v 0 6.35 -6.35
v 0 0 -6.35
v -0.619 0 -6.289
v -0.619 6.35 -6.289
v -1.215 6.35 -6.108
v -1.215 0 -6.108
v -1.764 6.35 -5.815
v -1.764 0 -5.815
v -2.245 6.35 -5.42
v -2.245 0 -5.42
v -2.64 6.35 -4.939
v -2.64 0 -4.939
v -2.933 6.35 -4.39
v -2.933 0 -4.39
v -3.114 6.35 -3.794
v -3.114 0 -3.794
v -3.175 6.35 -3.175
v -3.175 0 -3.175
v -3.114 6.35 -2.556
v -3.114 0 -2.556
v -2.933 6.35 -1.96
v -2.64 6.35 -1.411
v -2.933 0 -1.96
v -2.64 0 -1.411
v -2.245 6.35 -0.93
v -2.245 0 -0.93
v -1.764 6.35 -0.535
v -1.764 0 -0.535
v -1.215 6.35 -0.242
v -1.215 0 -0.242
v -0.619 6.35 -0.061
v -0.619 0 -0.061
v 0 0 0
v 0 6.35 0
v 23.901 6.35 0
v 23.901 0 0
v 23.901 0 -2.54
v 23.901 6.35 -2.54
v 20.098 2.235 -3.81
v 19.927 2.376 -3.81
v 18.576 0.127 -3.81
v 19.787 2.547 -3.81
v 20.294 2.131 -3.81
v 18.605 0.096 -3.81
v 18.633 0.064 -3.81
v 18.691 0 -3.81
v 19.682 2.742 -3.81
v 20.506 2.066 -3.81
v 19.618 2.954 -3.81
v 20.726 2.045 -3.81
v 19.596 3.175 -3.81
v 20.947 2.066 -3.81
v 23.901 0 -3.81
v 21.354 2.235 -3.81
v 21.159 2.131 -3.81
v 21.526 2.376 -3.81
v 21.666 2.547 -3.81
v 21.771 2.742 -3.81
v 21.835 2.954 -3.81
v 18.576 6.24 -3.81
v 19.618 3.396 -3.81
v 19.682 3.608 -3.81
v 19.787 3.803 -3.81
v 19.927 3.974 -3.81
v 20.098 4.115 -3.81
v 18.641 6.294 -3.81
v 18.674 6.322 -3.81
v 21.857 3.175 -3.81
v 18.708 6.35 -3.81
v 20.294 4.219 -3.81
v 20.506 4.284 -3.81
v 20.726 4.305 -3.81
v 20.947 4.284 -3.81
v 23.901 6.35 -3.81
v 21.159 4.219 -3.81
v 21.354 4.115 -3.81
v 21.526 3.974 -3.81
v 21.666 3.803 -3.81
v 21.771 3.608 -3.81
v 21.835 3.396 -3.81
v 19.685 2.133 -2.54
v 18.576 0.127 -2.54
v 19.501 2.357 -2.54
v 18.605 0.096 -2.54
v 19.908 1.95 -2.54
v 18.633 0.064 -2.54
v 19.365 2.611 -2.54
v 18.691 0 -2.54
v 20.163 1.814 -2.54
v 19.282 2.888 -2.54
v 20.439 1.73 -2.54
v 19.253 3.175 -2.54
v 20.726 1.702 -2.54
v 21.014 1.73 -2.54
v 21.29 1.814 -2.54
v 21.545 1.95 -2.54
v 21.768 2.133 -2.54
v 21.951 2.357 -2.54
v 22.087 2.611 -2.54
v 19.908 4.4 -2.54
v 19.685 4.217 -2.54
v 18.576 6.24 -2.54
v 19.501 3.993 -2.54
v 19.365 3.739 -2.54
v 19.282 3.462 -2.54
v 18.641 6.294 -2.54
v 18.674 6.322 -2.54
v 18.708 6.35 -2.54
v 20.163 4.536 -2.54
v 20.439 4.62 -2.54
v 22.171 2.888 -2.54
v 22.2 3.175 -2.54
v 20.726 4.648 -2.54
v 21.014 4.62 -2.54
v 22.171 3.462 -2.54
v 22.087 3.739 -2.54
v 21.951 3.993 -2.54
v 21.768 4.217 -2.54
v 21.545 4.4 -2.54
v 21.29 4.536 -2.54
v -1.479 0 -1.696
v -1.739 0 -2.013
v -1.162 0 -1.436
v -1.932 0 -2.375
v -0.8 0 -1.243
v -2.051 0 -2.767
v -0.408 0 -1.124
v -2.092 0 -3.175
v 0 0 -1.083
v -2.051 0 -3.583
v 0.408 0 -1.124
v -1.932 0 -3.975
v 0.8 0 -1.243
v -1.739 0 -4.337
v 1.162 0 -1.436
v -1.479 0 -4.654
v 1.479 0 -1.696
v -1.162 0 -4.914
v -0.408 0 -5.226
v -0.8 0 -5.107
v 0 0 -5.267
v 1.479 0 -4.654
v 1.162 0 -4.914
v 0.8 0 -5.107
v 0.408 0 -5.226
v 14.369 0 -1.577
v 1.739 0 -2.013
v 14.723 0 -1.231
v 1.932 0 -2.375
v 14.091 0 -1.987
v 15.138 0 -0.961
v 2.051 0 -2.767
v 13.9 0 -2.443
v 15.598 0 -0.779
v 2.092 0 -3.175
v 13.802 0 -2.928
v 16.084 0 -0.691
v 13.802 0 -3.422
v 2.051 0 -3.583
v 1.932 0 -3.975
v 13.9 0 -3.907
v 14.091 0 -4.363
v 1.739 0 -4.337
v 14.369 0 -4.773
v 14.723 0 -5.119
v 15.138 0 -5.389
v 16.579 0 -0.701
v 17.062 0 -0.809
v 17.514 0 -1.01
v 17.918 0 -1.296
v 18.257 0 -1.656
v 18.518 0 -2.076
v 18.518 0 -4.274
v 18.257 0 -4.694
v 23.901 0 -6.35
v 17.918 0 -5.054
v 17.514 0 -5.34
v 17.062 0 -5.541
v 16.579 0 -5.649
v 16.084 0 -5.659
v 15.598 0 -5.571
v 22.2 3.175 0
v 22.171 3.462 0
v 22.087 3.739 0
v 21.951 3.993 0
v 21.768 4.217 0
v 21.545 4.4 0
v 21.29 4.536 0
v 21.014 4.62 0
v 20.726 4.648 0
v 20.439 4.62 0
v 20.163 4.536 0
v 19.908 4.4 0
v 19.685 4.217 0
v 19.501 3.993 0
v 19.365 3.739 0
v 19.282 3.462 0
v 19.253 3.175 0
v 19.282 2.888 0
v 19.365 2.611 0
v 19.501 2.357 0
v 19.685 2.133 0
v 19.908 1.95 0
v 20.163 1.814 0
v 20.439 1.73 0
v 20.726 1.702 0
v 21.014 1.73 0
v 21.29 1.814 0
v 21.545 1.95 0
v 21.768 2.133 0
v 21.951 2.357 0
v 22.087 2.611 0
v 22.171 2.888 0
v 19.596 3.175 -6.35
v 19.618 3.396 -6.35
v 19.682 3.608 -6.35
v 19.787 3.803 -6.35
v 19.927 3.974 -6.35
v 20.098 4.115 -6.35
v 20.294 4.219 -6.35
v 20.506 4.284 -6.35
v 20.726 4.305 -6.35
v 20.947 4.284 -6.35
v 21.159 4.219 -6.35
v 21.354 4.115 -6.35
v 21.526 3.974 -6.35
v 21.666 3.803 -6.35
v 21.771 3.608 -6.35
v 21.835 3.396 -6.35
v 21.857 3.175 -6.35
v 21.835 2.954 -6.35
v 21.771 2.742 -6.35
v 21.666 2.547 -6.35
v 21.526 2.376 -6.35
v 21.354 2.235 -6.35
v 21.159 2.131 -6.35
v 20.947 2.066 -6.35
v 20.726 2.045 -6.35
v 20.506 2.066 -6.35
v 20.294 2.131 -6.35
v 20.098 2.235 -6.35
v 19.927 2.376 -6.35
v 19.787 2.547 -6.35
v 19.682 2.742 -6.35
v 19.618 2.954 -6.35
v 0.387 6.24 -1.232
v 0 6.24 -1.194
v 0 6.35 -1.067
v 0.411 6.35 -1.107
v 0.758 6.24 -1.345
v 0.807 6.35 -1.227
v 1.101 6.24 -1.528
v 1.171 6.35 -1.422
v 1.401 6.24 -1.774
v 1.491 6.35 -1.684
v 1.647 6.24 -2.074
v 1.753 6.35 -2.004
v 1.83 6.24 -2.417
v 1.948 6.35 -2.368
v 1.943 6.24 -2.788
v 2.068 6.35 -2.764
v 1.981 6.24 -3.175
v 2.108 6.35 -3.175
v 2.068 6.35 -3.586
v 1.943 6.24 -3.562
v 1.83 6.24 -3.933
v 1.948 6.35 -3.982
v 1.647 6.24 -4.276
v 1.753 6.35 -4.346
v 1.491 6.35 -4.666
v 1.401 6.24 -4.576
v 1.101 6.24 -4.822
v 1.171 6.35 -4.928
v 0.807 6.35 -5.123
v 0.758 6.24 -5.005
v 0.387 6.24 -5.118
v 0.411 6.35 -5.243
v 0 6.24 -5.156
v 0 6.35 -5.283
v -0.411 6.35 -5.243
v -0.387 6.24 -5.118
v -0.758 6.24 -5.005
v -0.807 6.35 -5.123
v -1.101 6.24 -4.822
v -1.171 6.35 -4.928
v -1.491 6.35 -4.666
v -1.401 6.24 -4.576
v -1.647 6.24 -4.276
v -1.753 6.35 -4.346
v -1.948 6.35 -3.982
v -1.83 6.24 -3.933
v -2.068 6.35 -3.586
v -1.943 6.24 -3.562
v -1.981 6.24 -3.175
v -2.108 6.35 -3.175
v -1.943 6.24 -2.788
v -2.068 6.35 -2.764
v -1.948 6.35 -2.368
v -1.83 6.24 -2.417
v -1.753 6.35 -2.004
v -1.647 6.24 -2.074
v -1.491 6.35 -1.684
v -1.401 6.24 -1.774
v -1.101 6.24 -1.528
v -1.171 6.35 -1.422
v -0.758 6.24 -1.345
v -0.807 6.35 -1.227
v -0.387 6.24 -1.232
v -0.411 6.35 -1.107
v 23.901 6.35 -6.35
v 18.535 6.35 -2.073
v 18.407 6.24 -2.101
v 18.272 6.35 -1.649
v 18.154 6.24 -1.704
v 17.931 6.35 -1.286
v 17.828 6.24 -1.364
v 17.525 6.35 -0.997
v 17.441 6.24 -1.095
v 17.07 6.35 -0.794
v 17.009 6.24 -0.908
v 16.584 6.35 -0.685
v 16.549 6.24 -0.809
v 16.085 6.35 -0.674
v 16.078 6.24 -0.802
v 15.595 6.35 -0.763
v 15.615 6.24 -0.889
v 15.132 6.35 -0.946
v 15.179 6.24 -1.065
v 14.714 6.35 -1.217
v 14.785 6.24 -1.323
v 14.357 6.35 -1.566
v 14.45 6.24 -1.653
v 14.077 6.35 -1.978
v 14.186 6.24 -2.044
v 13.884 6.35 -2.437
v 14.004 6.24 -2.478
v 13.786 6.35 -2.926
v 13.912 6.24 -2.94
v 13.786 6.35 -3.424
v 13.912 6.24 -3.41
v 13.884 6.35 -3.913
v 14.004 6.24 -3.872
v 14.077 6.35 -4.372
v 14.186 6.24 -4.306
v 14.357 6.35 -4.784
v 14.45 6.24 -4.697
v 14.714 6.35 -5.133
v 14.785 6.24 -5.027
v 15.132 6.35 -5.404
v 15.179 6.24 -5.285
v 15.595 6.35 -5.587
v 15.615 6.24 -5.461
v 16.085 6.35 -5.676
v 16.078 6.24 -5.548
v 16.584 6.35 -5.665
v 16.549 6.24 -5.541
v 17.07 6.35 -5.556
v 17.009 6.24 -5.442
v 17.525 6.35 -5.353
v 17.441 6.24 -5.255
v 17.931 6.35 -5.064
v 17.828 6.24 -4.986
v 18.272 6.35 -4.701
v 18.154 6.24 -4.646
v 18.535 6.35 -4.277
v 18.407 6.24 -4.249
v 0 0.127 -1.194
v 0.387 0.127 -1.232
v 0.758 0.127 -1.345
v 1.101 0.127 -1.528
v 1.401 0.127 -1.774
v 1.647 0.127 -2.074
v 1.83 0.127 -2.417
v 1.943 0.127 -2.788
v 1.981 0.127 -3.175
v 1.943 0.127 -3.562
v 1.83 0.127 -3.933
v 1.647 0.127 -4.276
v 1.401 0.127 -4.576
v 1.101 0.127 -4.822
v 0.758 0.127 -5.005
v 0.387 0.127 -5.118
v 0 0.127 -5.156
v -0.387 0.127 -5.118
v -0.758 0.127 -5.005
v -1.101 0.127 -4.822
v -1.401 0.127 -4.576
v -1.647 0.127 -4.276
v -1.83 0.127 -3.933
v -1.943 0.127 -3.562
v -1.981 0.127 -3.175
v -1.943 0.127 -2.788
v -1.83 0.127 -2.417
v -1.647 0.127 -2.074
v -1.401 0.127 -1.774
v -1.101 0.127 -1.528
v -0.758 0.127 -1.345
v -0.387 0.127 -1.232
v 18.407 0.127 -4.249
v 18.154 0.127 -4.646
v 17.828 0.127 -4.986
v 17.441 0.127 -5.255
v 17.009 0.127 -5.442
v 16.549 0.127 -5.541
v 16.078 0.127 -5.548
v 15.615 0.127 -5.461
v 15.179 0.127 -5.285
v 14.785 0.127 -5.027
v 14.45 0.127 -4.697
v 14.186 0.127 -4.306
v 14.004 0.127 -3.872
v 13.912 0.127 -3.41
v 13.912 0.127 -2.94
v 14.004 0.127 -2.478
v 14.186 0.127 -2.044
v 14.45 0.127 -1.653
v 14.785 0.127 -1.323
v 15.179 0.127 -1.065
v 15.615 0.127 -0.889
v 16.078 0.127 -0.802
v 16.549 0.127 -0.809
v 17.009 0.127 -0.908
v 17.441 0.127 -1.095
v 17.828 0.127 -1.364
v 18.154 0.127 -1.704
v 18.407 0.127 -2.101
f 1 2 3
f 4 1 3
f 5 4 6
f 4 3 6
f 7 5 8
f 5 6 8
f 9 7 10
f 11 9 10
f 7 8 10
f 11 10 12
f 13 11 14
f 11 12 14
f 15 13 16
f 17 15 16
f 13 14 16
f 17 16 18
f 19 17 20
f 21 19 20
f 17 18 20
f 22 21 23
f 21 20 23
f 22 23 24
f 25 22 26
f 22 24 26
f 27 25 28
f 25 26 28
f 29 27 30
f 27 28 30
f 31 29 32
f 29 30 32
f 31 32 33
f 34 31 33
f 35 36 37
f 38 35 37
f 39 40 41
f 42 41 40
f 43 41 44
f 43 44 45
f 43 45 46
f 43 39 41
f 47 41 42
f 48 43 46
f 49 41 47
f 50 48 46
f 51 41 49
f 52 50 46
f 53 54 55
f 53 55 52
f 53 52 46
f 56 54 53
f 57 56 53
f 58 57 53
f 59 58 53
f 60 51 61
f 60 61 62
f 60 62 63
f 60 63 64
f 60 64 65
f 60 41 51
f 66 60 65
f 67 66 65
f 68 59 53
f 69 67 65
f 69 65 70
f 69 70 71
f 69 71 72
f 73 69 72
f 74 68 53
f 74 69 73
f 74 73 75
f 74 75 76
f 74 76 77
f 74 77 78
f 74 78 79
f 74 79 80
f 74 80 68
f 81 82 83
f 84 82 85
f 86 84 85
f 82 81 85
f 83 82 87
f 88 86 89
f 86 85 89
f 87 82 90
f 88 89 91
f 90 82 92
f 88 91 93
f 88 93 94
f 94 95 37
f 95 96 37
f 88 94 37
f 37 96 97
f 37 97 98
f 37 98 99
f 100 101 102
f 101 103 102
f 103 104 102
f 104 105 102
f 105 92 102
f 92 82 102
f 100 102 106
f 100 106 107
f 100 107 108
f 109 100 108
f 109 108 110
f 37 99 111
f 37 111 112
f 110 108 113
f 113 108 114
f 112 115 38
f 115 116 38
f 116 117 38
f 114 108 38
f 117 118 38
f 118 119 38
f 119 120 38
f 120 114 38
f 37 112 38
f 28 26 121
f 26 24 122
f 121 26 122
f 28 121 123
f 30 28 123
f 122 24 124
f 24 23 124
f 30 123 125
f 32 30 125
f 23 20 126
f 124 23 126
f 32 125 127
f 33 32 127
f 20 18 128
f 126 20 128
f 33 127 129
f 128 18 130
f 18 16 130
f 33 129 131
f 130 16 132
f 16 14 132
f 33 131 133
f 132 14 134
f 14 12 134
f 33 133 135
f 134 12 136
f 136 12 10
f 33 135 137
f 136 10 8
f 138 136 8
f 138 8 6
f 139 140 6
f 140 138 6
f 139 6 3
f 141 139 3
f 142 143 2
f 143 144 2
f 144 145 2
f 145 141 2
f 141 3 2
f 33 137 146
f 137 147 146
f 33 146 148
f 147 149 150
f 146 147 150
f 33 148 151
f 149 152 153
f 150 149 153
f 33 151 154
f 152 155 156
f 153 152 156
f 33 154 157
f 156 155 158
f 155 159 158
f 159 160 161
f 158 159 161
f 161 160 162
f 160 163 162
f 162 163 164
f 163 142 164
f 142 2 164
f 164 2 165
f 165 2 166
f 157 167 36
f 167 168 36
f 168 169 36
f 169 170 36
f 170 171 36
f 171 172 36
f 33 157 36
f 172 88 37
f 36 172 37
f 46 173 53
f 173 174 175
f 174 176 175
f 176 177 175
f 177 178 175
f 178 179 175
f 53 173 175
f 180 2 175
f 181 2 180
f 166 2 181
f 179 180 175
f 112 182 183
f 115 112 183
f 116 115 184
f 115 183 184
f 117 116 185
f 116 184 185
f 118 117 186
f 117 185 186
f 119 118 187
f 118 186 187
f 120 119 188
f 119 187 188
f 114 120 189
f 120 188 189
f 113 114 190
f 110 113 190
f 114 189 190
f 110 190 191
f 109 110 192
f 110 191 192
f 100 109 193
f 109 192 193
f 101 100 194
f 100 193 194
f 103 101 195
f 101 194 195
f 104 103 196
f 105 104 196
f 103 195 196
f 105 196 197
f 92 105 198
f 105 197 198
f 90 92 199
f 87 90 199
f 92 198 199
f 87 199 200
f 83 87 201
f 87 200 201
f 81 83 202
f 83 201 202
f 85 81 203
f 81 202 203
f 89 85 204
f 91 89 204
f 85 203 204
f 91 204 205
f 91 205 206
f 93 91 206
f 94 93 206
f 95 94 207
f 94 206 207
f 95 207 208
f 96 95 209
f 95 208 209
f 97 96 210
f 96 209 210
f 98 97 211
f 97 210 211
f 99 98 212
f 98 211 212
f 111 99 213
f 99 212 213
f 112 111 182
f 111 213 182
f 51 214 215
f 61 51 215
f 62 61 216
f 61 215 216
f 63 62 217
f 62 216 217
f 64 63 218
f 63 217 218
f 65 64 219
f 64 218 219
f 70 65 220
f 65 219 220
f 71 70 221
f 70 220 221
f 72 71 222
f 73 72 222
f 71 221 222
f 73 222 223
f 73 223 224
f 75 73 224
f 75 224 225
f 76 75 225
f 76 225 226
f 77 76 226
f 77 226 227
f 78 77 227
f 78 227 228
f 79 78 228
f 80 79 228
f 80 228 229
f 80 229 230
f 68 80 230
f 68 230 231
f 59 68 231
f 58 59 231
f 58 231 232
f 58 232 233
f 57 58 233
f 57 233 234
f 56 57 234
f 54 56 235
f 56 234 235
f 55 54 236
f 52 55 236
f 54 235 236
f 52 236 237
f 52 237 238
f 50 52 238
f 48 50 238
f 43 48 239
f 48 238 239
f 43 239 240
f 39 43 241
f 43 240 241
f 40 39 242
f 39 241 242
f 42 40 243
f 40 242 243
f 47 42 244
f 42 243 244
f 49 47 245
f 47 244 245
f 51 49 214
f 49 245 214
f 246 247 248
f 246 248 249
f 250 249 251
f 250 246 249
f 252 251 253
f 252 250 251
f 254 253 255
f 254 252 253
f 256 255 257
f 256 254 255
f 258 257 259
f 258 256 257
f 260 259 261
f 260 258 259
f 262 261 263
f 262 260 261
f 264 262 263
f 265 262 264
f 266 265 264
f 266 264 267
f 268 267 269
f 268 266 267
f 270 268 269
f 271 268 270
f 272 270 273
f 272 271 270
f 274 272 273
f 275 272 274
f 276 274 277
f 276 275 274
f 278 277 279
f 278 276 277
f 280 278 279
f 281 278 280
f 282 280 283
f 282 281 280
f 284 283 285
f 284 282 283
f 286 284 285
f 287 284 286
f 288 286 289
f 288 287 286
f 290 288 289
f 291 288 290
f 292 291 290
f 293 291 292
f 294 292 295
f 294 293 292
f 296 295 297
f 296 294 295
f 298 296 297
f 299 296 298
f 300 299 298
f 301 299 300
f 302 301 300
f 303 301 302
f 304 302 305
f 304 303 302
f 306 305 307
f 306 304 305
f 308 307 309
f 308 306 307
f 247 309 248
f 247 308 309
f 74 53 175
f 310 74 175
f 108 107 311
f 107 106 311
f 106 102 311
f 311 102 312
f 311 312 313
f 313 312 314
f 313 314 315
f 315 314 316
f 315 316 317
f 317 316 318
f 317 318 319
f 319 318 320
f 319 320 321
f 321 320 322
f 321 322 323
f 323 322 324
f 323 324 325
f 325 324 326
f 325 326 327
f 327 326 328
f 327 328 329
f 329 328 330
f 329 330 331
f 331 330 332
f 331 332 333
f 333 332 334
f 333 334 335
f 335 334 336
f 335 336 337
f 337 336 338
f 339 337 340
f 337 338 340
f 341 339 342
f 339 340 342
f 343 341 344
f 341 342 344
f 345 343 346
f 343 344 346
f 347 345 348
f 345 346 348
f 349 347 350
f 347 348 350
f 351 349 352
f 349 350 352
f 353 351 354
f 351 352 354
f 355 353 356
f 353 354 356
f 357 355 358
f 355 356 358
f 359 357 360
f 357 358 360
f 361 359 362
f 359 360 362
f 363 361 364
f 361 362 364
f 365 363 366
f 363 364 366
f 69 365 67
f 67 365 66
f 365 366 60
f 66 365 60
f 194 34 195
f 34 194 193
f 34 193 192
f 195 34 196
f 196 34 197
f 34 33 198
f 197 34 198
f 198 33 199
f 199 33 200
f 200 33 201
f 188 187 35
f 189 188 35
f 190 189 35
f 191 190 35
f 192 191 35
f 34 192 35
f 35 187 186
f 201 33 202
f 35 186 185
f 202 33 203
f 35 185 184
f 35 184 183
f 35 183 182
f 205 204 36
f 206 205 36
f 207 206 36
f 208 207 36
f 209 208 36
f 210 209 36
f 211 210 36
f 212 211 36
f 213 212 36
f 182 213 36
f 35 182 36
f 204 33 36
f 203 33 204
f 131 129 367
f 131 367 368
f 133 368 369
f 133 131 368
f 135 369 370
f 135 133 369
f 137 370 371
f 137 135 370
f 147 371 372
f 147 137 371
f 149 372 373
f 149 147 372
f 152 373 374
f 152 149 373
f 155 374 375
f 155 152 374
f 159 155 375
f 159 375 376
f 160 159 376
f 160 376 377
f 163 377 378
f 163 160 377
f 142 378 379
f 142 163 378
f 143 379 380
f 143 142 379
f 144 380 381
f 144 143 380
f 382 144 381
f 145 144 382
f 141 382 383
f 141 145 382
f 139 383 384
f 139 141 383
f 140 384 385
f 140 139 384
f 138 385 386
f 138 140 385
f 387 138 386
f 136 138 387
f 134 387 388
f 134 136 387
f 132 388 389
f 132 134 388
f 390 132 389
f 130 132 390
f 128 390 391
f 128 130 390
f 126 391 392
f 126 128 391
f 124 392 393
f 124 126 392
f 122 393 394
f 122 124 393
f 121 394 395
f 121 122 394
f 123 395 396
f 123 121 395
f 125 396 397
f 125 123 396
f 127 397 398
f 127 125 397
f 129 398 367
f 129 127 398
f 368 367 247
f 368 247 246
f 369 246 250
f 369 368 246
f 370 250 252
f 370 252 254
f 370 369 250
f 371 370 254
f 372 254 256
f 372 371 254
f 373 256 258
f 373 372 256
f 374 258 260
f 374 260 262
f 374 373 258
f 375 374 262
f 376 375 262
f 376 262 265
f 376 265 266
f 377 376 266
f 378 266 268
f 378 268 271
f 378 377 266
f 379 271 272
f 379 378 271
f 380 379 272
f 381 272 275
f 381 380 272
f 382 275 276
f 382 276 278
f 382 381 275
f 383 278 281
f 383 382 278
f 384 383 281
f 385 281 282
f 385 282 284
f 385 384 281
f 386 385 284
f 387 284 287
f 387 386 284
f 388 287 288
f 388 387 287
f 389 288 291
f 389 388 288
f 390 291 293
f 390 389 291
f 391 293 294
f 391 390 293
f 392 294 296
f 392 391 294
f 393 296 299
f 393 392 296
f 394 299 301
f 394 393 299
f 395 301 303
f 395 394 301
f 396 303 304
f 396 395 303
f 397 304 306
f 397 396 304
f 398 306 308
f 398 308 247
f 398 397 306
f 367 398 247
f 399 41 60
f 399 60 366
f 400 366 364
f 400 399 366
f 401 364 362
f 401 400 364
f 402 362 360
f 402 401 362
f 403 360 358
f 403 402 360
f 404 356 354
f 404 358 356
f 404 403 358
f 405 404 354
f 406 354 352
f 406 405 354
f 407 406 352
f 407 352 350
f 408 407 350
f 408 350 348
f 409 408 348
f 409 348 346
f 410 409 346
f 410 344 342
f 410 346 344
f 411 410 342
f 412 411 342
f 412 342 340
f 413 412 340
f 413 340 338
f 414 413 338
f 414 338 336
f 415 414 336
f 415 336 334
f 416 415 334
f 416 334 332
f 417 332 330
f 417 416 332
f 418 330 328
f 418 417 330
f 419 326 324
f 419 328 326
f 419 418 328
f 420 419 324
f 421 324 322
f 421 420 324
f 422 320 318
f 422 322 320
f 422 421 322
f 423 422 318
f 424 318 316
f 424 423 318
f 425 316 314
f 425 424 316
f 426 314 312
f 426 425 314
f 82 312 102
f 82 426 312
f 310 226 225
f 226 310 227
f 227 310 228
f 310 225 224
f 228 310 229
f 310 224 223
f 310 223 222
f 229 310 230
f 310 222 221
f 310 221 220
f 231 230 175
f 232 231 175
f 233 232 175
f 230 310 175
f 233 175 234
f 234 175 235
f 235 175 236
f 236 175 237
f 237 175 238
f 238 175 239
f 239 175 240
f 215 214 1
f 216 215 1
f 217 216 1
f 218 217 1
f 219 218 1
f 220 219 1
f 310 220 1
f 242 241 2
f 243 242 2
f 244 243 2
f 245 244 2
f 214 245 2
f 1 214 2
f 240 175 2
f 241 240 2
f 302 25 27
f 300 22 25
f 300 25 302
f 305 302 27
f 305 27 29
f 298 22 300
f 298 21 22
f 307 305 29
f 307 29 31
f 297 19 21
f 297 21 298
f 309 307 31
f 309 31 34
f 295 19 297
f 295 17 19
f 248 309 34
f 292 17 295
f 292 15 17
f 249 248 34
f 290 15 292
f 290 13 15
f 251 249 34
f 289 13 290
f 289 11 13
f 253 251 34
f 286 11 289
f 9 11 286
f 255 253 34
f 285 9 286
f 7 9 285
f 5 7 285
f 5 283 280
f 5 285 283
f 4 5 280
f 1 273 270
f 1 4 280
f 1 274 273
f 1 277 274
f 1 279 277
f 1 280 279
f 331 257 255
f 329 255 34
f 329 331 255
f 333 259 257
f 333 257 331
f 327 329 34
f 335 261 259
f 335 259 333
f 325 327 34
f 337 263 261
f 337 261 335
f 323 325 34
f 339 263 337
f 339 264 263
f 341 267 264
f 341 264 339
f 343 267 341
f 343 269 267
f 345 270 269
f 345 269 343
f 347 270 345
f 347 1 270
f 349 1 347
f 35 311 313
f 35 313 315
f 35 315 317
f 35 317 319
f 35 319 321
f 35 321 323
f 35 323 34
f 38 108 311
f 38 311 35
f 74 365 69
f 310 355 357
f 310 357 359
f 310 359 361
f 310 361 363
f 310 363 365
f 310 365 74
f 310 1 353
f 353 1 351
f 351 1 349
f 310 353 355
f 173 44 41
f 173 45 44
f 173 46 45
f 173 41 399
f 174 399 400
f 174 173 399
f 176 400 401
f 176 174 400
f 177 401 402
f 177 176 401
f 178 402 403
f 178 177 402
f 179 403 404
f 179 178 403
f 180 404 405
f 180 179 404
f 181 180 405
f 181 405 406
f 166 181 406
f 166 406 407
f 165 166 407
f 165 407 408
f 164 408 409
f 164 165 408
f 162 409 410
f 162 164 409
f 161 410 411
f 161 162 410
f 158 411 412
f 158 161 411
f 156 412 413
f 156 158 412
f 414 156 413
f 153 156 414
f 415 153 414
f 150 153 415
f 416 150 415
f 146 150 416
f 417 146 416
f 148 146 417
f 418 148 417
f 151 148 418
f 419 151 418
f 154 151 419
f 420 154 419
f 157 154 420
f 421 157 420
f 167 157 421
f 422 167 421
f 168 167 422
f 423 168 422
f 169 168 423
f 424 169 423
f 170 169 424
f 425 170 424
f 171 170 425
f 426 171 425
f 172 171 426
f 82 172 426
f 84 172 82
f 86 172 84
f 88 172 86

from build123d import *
from OCP.BRepFilletAPI import BRepFilletAPI_MakeChamfer

# Parameters (mm, degrees)
SKETCH1_R                  = 1.9812
SKETCH1_R_2                = 2.38125
BOSS_EXTRUDE1_DEPTH        = 6.35
SKETCH2_W                  = 7.62
SKETCH2_H                  = 1.27
CUT_EXTRUDE1_DEPTH         = 26.532761738
CHAMFER1_SIZE              = 0.127
CHAMFER1_SIZE2             = 0.110399416
F_4_40_TAPPED_HOLE1_REACH  = 27.533
F_4_40_TAPPED_HOLE1_BORE_R = 1.1303
SKETCH5_R                  = 1.4732
CUT_EXTRUDE2_DEPTH         = 2.54


with BuildPart() as part:
    # Sketch1 → Boss-Extrude1 (new body)
    with BuildSketch(Plane(origin=(0, 0, 0), x_dir=(1, 0, 0), z_dir=(0, 1, 0))):
        with BuildLine():
            Line((0, 0), (23.9014, 0))
            Line((23.9014, 0), (23.9014, 6.35))
            Line((23.9014, 6.35), (0, 6.35))
            ThreePointArc((0, 6.35), (-3.175, 3.175), (0, 0))
        make_face()
        with Locations(Location((0, 3.175, 0), (0, 0, 270))):
            Circle(SKETCH1_R, mode=Mode.SUBTRACT)
        with Locations(Location((16.2814, 3.175, 0), (0, 0, 270))):
            Circle(SKETCH1_R_2, mode=Mode.SUBTRACT)
    extrude(amount=BOSS_EXTRUDE1_DEPTH)

    # Sketch2 → Cut-Extrude1 (cut, through all)
    with BuildSketch(Plane(origin=(0, 6.35, 0), x_dir=(1, 0, 0), z_dir=(0, 1, 0))):
        with Locations((20.0914, 3.175)):
            Rectangle(SKETCH2_W, SKETCH2_H)
    extrude(amount=-CUT_EXTRUDE1_DEPTH, mode=Mode.SUBTRACT)

    # Chamfer1: one chamfer whose edges measure the first distance from different faces: ONE call of the kernel's chamfer builder (chamfer() names one face for all edges)
    chamfer1_edges_1 = [part.edges().sort_by_distance(p)[0] for p in [
        (0, 0, -5.1562),
    ]]
    chamfer1_side_1 = [part.faces().sort_by_distance(p)[0] for p in [
        (0, 3.175, -5.1562),
    ]]
    chamfer1_edges_2 = [part.edges().sort_by_distance(p)[0] for p in [
        (0, 6.35, -5.1562),
        (13.90015, 6.35, -3.175),
    ]]
    chamfer1_side_2 = [part.faces().sort_by_distance(p)[0] for p in [
        (10.400868542, 6.35, -3.175),
    ]]
    chamfer1_edges_3 = [part.edges().sort_by_distance(p)[0] for p in [
        (13.90015, 0, -3.175),
    ]]
    chamfer1_side_3 = [part.faces().sort_by_distance(p)[0] for p in [
        (13.90015, 3.175, -3.175),
    ]]
    chamfer1 = BRepFilletAPI_MakeChamfer(part.part.solid().wrapped)
    for e in chamfer1_edges_1:
        chamfer1.Add(CHAMFER1_SIZE, CHAMFER1_SIZE2, e.wrapped, chamfer1_side_1[0].wrapped)  # the first distance lies on this face
    for e in chamfer1_edges_2:
        chamfer1.Add(CHAMFER1_SIZE, CHAMFER1_SIZE2, e.wrapped, chamfer1_side_2[0].wrapped)  # the first distance lies on this face
    for e in chamfer1_edges_3:
        chamfer1.Add(CHAMFER1_SIZE, CHAMFER1_SIZE2, e.wrapped, chamfer1_side_3[0].wrapped)  # the first distance lies on this face
    add(Compound.cast(chamfer1.Shape()), mode=Mode.REPLACE)

    # #4-40 Tapped Hole1 bore → #4-40 Tapped Hole1 (cut, up to next)
    with BuildSketch(Plane(origin=(0, 0, -6.35), x_dir=(-1, 0, 0), z_dir=(0, 0, -1)), mode=Mode.PRIVATE) as f_4_40_tapped_hole1_sk1:
        with Locations((-20.7264, 3.175)):
            Circle(F_4_40_TAPPED_HOLE1_BORE_R)
    f_4_40_tapped_hole1_tool1 = extrude(f_4_40_tapped_hole1_sk1.sketch, amount=-F_4_40_TAPPED_HOLE1_REACH, mode=Mode.PRIVATE) & part.part
    add(f_4_40_tapped_hole1_tool1.solids().sort_by_distance((20.7264, 3.175, -6.35))[0], mode=Mode.SUBTRACT)

    # Sketch5 → Cut-Extrude2 (cut)
    with BuildSketch(Plane.XY):
        with Locations((20.7264, 3.175)):
            Circle(SKETCH5_R)
    extrude(amount=-CUT_EXTRUDE2_DEPTH, mode=Mode.SUBTRACT)


solid = part.part
